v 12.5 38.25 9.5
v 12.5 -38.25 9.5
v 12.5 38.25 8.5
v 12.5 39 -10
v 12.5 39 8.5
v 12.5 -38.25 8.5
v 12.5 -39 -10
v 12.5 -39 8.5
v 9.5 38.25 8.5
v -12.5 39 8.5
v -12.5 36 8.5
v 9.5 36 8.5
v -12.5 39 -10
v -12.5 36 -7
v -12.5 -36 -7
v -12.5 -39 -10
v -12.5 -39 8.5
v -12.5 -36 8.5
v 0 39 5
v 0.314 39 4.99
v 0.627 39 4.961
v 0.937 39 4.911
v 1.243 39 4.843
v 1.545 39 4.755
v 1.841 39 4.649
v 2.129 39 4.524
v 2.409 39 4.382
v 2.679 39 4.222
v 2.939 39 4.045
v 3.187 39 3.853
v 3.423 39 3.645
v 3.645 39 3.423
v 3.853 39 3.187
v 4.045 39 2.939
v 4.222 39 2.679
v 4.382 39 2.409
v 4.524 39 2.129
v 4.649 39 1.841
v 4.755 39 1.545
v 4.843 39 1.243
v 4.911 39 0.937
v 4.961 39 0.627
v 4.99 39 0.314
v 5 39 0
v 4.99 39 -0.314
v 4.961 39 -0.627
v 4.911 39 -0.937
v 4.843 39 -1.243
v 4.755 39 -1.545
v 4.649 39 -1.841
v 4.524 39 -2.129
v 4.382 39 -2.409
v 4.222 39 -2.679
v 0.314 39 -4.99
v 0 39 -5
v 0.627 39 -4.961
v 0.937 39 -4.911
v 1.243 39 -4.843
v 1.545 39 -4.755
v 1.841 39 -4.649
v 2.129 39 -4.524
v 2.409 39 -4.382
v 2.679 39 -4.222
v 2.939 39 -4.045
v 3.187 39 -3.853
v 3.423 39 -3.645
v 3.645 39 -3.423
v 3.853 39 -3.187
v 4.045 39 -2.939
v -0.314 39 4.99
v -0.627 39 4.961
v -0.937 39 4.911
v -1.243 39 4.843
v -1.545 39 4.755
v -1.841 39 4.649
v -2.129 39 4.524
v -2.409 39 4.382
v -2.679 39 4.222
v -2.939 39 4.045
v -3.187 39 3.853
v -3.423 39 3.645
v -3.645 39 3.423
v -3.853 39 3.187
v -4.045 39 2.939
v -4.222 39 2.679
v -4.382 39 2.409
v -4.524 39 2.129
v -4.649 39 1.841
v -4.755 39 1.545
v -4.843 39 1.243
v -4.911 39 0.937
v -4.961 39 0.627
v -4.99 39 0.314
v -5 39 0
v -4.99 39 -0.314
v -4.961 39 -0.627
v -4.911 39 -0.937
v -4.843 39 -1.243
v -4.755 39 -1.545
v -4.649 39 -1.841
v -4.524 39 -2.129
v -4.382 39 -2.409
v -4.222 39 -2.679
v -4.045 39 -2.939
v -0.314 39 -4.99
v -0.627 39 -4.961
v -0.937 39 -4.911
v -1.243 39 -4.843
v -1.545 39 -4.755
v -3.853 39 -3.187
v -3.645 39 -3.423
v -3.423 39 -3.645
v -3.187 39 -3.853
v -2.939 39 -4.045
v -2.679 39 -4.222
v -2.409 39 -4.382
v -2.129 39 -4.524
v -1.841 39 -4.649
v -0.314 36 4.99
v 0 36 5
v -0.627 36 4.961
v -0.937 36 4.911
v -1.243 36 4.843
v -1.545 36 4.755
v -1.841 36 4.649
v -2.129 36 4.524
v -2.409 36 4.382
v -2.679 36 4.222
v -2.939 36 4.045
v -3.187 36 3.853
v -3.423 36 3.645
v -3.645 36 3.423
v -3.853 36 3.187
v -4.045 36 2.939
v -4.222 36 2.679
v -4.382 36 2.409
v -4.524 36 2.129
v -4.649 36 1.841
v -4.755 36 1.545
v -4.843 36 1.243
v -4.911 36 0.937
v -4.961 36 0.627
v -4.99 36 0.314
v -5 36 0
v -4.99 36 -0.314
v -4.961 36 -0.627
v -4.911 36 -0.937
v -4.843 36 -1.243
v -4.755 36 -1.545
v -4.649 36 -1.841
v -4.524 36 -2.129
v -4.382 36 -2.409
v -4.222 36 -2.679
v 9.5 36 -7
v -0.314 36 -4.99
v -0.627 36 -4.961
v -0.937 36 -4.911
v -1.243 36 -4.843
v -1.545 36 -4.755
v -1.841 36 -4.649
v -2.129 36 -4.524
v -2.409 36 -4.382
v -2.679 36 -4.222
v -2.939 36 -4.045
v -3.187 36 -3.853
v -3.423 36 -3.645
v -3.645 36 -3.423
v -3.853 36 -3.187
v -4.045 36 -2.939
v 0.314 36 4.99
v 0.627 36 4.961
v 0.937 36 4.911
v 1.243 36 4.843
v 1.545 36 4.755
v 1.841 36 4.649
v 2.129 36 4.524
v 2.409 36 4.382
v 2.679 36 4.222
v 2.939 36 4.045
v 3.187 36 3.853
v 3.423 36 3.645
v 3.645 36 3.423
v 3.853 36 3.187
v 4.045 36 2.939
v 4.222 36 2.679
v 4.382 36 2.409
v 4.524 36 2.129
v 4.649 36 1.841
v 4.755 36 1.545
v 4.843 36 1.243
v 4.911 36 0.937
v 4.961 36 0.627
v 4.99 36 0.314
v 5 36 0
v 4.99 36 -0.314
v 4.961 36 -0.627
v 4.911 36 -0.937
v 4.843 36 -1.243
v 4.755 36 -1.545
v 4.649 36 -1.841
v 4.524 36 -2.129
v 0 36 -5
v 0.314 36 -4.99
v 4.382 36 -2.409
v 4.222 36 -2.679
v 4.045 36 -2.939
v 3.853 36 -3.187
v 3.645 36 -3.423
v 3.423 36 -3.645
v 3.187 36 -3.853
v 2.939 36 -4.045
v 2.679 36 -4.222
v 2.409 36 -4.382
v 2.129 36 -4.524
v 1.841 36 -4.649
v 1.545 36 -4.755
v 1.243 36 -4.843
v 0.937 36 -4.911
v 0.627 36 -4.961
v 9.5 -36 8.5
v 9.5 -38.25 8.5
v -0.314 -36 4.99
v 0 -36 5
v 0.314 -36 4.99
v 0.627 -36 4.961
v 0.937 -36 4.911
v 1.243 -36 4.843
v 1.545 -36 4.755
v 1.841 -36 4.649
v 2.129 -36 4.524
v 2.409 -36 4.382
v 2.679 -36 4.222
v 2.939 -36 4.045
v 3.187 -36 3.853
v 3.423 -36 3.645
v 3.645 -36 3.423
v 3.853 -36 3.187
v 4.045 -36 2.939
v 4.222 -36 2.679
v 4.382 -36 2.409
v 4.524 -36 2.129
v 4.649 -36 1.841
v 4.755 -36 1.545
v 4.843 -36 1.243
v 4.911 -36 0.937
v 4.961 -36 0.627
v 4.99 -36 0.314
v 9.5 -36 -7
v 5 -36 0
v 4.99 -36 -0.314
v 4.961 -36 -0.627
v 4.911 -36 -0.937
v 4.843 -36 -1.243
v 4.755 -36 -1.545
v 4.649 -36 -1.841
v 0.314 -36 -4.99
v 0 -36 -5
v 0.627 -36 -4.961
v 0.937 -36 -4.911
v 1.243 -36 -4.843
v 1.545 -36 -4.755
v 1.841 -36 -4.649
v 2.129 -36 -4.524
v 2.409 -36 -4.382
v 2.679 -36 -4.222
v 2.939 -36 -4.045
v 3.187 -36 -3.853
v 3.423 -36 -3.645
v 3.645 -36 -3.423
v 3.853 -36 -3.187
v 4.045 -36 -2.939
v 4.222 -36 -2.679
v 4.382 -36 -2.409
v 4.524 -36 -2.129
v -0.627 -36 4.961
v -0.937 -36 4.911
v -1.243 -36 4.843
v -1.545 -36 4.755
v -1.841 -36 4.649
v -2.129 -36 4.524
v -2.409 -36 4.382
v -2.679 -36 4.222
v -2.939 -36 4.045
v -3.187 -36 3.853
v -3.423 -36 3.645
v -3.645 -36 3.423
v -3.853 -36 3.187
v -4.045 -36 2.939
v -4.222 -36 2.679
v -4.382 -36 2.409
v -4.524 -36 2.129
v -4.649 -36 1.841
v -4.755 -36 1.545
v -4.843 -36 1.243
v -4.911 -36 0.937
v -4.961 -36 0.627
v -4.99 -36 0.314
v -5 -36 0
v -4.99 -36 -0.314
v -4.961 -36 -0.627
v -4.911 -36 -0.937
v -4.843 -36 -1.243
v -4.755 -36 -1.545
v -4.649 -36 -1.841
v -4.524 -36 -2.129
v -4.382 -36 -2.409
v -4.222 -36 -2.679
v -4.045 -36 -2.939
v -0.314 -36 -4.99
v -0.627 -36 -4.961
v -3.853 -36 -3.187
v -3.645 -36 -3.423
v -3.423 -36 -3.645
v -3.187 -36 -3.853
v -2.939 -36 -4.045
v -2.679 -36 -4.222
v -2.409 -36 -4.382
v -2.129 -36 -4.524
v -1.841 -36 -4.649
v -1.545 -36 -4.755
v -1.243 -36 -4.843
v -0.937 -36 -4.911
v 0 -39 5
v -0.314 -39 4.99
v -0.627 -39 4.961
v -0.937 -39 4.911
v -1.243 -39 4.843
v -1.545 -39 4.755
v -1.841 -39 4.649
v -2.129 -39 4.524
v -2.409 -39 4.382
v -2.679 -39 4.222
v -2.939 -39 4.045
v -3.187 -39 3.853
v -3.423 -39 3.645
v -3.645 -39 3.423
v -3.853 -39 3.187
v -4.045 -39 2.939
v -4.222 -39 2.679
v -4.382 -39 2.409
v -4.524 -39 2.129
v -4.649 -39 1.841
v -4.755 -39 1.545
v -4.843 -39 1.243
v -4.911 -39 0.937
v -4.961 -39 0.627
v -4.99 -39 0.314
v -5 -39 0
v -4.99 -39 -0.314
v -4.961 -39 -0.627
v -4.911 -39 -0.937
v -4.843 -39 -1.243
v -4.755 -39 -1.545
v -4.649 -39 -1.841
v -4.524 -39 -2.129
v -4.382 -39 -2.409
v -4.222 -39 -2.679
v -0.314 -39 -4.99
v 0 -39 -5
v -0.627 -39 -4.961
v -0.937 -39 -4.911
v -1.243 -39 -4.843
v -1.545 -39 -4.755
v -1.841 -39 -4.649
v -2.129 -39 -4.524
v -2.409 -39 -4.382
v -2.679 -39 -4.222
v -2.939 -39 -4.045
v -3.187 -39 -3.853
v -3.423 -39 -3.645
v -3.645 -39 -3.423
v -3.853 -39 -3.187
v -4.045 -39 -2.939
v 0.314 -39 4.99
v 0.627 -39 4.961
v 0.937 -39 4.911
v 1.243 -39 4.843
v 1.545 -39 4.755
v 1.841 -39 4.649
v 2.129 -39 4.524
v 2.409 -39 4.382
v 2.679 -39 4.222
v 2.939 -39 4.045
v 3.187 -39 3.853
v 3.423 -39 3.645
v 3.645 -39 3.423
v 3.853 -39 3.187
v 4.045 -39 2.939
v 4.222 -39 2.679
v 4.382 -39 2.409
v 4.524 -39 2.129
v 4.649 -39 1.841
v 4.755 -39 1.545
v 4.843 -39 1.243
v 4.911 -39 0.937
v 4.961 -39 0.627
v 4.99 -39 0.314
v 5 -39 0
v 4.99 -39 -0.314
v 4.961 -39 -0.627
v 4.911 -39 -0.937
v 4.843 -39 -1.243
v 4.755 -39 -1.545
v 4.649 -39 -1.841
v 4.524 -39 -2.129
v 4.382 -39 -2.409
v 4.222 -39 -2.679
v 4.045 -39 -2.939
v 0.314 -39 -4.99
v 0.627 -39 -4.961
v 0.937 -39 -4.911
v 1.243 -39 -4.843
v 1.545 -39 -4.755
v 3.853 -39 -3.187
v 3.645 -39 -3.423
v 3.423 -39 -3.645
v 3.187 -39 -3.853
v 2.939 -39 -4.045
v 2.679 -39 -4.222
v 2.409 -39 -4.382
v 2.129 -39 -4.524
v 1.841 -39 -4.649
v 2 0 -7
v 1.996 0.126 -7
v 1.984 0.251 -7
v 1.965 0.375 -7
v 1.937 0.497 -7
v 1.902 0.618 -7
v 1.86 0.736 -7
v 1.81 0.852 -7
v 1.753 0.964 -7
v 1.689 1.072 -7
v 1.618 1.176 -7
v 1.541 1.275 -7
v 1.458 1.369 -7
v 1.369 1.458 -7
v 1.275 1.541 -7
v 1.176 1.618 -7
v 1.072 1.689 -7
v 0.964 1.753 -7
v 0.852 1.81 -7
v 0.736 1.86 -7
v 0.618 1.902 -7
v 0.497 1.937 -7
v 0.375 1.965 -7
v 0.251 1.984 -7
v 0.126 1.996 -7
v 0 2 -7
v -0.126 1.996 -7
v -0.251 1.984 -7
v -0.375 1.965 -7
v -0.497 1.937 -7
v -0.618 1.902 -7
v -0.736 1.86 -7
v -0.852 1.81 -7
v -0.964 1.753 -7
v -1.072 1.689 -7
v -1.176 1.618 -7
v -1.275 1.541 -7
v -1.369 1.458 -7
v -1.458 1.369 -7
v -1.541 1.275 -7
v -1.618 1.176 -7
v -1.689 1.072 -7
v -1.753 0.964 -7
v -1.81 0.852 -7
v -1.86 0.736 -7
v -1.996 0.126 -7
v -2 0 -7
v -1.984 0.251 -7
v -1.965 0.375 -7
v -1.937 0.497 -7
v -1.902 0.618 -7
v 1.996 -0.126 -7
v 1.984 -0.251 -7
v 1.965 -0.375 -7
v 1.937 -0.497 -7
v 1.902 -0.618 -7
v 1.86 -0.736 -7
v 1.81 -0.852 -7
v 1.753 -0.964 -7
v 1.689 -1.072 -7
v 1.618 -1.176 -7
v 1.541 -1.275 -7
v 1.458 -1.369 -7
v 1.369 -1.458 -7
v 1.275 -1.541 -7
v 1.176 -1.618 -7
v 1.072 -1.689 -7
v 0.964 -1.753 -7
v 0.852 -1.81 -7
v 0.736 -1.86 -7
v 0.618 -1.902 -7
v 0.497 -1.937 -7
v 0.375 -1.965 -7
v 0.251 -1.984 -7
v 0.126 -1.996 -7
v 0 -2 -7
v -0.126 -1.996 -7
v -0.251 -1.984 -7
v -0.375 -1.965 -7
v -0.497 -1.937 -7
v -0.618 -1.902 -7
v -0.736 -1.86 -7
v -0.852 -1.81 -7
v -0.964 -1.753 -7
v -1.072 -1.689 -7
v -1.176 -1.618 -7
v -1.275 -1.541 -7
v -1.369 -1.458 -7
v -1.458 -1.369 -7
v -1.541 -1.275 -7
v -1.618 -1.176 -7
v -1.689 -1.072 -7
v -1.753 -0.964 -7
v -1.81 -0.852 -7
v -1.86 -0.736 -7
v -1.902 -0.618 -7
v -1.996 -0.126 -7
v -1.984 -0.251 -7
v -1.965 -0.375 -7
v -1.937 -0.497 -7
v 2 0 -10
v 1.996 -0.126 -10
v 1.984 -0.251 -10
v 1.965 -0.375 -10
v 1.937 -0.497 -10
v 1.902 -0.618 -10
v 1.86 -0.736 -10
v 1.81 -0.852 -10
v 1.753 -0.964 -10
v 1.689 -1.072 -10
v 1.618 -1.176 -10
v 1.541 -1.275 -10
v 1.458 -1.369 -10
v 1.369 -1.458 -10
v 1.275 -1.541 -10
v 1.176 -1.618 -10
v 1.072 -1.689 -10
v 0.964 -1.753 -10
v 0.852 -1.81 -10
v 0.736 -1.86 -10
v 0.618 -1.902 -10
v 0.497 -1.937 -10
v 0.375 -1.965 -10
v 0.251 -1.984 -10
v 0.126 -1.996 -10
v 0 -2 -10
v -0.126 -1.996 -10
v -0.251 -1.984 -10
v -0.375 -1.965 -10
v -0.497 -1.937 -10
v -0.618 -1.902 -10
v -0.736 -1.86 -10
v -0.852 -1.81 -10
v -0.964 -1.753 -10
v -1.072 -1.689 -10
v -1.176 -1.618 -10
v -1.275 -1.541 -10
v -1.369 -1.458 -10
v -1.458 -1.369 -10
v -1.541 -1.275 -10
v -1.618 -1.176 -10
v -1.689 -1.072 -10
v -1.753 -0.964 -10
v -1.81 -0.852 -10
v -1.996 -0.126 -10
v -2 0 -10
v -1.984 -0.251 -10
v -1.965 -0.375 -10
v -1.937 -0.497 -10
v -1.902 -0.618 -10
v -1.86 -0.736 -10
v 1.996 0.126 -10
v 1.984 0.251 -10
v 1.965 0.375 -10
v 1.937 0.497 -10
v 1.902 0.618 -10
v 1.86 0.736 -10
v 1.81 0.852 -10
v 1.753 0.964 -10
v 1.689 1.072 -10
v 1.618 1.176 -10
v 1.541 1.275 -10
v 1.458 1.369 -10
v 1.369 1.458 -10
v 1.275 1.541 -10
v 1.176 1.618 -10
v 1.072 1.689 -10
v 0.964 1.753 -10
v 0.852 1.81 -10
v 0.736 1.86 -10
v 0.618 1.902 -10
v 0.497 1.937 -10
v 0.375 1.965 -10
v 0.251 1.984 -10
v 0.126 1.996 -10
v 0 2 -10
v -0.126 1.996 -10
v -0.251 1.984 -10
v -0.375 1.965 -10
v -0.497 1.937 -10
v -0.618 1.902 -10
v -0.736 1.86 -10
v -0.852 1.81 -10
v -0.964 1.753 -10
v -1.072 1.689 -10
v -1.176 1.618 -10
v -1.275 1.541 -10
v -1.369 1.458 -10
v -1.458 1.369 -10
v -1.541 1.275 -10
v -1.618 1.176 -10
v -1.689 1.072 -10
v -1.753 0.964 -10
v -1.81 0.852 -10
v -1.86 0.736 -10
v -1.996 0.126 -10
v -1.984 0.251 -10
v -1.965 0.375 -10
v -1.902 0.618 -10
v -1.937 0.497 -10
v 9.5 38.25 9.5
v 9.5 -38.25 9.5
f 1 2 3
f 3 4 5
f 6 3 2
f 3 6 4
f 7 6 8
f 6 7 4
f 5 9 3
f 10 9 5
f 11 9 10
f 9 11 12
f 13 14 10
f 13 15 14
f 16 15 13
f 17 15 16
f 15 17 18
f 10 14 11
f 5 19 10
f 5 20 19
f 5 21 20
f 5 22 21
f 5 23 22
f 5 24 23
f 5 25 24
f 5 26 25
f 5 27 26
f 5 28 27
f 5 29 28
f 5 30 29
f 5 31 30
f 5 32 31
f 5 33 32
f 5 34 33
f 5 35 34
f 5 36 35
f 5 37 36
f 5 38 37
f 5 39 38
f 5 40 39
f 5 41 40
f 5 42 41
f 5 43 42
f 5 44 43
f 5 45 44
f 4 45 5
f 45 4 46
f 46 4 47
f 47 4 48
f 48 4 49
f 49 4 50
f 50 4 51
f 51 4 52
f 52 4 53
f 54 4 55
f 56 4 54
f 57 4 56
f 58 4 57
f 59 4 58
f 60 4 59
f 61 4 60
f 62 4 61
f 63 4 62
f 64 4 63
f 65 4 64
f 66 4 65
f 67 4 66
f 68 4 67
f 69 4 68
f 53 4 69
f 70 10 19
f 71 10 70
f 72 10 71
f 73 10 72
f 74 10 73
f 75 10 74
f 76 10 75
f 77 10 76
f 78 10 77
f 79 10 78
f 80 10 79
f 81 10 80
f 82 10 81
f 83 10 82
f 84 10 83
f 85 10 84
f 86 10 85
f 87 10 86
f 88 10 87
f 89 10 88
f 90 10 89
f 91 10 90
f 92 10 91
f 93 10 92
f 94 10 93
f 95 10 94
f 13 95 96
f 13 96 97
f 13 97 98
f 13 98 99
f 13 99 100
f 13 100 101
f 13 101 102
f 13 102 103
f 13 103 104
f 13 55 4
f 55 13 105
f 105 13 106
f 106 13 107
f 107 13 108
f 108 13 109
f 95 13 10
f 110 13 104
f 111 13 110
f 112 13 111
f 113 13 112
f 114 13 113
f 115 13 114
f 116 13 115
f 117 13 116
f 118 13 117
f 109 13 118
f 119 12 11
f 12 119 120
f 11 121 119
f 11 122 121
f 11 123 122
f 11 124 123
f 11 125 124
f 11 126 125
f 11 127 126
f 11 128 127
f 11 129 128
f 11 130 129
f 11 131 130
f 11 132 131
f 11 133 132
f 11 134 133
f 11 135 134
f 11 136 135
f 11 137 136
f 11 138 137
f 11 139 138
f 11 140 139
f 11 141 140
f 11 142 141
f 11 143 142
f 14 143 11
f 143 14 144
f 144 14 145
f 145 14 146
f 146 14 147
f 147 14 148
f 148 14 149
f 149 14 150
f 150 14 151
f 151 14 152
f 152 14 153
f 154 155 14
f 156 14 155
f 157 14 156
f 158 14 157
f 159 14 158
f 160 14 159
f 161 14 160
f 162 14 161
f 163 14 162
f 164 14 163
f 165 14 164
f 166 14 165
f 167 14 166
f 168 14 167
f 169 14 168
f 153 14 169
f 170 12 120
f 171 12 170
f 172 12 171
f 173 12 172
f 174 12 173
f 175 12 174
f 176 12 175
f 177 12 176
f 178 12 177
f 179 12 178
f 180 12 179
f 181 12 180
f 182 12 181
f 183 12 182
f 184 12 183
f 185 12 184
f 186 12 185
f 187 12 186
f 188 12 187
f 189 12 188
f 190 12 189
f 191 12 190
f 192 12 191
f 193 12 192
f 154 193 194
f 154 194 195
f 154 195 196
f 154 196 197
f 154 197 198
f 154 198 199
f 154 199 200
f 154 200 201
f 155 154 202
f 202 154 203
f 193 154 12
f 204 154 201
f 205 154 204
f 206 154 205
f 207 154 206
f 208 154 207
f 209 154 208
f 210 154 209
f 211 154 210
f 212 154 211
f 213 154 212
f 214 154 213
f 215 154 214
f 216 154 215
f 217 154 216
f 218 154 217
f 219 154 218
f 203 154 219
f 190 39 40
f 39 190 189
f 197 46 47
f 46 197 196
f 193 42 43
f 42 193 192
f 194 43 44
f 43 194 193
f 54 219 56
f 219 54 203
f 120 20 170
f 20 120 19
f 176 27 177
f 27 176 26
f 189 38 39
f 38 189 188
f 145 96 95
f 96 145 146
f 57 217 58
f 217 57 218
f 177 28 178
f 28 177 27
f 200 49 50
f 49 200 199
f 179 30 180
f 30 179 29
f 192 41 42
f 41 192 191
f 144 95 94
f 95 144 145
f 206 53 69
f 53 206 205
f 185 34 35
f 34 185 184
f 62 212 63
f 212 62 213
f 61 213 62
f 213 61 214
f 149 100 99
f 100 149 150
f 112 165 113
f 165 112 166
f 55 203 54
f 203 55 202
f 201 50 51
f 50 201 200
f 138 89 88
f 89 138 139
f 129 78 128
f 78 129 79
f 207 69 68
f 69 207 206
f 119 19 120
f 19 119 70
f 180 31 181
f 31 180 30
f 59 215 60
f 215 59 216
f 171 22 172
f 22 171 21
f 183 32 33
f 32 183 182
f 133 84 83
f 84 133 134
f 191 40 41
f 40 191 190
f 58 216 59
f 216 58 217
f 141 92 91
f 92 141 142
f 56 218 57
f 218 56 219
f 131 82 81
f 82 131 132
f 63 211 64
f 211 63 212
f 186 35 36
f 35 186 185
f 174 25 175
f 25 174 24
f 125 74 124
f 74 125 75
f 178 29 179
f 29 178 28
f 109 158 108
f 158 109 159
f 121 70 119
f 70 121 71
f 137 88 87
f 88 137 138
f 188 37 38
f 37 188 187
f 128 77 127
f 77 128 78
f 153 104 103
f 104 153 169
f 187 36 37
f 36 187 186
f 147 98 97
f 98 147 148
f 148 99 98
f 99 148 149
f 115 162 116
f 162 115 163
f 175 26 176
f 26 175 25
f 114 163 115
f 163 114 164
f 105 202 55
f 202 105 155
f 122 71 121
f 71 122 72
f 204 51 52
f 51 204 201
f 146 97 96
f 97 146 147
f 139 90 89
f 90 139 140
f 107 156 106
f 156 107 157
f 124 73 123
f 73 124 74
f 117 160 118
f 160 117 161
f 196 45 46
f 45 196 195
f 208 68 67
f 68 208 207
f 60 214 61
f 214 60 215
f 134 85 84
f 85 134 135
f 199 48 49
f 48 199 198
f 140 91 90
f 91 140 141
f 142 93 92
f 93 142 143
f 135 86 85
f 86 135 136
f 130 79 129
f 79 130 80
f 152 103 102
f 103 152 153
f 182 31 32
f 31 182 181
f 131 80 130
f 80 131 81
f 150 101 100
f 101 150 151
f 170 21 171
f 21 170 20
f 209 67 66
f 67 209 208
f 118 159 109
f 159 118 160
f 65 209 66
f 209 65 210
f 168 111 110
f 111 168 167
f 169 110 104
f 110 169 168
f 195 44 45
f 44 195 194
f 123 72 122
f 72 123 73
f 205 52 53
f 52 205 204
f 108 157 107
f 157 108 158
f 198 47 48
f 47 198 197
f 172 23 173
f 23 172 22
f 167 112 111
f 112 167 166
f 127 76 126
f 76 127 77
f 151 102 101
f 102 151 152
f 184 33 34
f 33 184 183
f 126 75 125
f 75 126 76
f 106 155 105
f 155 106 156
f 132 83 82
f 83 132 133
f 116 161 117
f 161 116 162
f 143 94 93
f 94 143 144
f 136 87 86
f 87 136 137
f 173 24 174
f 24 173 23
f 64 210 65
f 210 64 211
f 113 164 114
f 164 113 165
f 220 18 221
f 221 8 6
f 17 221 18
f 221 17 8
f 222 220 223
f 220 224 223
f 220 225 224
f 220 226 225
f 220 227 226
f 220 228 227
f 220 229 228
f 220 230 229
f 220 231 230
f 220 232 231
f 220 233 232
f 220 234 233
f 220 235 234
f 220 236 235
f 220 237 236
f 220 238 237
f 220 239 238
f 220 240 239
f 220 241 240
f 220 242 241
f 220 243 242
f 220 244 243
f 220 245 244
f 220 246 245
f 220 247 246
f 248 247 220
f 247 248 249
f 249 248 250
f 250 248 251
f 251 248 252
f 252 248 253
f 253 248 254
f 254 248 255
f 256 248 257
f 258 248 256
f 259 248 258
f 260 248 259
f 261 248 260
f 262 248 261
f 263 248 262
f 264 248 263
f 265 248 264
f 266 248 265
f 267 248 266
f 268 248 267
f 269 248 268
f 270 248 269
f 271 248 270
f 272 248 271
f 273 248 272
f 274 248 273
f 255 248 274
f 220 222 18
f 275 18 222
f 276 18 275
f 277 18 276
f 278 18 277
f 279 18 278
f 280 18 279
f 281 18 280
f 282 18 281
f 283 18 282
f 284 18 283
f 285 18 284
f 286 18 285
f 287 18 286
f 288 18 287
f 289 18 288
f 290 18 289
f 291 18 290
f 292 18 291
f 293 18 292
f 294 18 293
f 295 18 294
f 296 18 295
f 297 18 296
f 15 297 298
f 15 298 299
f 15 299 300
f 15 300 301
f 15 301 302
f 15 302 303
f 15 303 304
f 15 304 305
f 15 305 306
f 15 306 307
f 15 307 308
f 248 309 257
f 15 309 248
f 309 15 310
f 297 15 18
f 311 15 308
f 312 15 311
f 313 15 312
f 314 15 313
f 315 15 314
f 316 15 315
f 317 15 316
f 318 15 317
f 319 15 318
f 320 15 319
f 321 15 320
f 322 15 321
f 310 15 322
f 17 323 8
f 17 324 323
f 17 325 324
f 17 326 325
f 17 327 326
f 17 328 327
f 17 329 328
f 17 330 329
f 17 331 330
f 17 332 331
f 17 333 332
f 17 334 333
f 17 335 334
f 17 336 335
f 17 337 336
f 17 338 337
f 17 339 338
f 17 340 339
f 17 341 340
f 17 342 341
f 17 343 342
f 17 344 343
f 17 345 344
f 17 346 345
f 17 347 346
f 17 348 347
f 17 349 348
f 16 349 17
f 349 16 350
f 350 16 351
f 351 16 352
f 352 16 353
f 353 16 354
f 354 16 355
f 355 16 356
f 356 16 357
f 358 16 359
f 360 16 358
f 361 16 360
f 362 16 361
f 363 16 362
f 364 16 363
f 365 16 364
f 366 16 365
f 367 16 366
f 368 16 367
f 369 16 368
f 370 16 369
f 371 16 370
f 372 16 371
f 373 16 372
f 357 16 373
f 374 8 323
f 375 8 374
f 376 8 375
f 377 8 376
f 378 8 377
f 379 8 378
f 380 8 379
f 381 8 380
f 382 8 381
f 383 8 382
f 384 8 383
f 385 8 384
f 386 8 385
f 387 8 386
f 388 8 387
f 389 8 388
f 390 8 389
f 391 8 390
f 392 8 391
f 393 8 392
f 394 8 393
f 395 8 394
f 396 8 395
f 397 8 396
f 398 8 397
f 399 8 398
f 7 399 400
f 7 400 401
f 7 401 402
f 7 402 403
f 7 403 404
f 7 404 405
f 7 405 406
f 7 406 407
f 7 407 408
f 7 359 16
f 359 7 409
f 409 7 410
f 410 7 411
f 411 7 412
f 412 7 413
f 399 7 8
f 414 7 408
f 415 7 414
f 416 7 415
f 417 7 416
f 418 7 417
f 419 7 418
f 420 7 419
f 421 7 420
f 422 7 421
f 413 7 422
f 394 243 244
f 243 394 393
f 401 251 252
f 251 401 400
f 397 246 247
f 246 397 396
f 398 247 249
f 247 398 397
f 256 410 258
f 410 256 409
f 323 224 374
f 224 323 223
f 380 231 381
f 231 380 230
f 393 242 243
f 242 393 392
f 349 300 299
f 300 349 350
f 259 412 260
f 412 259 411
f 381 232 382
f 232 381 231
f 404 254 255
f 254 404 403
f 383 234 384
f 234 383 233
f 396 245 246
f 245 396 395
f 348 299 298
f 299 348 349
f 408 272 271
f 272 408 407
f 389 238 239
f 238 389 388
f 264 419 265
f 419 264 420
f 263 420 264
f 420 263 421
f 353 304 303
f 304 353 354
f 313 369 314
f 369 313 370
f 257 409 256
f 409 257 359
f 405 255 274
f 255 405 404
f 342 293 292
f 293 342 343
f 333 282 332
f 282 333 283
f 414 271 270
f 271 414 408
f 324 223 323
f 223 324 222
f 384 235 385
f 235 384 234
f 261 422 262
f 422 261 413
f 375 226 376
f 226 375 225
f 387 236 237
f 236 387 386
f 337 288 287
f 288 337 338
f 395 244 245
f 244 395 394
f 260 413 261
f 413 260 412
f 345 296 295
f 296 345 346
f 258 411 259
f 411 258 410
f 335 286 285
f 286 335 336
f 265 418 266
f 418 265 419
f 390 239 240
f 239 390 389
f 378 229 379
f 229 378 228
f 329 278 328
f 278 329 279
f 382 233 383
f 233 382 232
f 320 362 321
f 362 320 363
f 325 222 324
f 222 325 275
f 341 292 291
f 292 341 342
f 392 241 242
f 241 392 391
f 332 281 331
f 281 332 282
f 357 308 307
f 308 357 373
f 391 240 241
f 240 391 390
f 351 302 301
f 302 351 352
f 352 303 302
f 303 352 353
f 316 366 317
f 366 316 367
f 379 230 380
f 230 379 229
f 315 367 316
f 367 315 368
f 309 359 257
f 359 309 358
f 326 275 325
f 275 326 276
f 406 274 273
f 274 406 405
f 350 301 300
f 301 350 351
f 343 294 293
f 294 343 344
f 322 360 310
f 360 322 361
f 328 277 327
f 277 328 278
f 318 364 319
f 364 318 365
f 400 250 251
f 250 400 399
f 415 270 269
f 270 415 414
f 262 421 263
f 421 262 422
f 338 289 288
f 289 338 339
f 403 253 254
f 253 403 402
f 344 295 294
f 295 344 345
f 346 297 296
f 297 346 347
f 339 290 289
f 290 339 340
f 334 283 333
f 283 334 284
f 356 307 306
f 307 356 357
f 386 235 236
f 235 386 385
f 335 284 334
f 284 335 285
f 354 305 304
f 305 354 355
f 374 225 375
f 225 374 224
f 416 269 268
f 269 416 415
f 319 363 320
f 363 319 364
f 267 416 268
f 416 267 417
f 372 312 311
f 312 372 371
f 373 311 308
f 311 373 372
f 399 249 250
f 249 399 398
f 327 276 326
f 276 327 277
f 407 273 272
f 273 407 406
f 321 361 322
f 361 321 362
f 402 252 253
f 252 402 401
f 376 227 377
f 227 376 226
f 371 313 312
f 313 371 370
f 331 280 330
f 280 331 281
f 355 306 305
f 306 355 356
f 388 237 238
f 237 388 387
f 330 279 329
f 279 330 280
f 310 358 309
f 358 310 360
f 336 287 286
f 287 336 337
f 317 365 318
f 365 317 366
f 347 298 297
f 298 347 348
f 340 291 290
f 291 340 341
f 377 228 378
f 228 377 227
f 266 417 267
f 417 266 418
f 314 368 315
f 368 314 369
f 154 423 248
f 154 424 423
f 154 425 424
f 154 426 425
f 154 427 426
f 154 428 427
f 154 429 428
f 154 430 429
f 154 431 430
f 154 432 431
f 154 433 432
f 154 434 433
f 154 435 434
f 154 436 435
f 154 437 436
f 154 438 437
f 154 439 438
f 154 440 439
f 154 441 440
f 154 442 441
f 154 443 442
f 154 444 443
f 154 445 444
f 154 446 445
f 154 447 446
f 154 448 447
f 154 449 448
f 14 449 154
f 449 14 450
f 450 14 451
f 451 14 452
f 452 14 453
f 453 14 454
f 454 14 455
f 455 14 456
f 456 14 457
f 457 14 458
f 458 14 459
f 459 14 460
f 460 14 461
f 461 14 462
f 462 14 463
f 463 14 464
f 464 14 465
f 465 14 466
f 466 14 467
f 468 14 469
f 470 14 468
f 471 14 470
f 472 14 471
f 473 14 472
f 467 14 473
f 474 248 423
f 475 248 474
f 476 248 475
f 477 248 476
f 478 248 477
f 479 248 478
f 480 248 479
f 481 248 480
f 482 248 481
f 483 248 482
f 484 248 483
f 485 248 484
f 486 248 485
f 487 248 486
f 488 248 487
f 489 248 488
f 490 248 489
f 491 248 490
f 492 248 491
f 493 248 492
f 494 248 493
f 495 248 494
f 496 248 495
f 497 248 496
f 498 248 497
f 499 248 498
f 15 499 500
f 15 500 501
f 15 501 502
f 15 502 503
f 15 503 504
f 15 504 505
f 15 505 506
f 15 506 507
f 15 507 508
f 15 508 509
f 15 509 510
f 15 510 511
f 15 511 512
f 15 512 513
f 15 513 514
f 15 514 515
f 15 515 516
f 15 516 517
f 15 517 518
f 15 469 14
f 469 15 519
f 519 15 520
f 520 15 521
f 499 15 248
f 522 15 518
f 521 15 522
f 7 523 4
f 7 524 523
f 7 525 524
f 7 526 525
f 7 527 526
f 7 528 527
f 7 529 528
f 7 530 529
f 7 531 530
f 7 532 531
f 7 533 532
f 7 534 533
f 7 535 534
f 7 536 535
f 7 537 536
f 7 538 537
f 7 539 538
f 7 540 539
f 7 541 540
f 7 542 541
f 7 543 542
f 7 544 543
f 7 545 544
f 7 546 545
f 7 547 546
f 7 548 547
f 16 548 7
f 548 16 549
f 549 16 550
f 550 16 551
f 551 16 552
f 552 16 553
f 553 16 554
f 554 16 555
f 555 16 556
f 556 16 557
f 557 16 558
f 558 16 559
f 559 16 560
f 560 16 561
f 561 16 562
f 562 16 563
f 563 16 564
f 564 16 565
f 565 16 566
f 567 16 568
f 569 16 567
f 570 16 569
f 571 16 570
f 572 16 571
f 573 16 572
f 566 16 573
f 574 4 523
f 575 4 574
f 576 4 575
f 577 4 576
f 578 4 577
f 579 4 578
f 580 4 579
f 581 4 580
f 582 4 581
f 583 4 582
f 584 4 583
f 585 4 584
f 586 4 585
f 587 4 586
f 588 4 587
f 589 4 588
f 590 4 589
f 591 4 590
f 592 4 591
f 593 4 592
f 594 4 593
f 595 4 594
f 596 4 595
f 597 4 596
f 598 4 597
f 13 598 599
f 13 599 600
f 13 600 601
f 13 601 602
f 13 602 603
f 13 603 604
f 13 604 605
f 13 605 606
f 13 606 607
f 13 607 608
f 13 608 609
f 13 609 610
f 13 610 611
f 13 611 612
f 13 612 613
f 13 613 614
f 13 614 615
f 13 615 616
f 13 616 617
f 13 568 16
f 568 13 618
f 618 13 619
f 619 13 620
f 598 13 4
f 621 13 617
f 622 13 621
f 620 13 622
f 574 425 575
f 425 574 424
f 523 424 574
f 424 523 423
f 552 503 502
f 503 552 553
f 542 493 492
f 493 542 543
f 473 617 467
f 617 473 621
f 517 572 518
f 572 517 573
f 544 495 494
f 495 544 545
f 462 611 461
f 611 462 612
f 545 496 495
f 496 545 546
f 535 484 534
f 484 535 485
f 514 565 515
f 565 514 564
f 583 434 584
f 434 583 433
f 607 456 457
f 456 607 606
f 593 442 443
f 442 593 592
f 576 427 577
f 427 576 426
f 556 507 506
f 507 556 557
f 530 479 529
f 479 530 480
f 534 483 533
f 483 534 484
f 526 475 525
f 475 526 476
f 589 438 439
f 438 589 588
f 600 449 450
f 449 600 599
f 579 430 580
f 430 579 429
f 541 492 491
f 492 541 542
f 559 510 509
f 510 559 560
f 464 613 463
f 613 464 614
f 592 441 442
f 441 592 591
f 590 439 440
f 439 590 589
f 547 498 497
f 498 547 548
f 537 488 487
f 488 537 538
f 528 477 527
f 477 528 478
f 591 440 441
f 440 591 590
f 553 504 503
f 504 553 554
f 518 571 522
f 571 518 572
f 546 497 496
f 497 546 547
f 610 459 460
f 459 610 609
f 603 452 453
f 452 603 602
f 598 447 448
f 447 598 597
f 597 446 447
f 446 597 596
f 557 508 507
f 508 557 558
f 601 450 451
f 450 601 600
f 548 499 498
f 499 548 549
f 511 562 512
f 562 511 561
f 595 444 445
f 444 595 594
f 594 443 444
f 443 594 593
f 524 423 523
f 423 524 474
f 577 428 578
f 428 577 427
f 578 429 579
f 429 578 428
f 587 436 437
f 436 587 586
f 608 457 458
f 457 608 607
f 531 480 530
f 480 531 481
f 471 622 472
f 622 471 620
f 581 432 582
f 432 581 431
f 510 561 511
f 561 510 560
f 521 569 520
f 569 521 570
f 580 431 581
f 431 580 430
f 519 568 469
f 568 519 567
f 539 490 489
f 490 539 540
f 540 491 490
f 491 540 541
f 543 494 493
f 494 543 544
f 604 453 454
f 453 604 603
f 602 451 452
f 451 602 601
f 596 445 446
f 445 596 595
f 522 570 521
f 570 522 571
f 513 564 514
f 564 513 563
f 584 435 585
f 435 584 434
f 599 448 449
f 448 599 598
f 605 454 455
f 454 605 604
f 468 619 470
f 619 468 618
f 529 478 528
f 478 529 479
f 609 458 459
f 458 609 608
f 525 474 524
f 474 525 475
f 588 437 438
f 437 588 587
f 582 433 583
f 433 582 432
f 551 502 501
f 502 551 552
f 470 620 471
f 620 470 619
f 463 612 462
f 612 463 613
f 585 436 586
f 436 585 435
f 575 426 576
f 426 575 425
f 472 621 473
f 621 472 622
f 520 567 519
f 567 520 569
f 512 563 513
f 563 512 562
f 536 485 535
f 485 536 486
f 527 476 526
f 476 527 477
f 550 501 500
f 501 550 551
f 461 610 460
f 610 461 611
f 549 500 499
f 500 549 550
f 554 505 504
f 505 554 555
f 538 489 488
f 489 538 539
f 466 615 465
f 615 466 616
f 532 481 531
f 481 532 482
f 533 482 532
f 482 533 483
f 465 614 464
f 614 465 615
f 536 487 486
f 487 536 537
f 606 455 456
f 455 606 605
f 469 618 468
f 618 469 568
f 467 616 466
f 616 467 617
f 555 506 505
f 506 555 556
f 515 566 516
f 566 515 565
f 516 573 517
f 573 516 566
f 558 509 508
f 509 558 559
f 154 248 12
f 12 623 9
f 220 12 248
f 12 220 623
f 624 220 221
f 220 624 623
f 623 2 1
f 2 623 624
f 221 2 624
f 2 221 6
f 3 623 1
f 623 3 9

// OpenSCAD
$fn = 100;
larghezza = 50+25;
spessore = 3;
lunghezza = 25;
altezza = 20-3;


module part_portaswitch(){
    for (i = [larghezza/2,-larghezza/2]){
        translate([0,i,0]){
            difference() {
                cube ([lunghezza,spessore,altezza],true);
                    rotate([90,0,0]){
                        cylinder(5,5,5,true);
                }
            }
        }
    }
    translate([0,0,-altezza/2]){
        cube([lunghezza,larghezza+spessore,spessore],true);
    }
}


for (i = [lunghezza/2-spessore/2]){
    translate([i,0,0]){
        rotate([0,90,0]){
            cube([lunghezza-spessore*2,larghezza+spessore/2,spessore],true);
        }
    }
}
/*
for (i = [-lunghezza/2+spessore/2]){
    translate([i,0,-6]){
        rotate([0,90,0]){
            cube([lunghezza/2-spessore*2,larghezza+spessore/2,spessore],true);
        }
    }
}

*/
module portaswitch(){
    difference(){
        part_portaswitch();
        translate([0,0,-altezza/2-spessore]){
            cylinder(6,2,2);
        }
    }
}

portaswitch();
